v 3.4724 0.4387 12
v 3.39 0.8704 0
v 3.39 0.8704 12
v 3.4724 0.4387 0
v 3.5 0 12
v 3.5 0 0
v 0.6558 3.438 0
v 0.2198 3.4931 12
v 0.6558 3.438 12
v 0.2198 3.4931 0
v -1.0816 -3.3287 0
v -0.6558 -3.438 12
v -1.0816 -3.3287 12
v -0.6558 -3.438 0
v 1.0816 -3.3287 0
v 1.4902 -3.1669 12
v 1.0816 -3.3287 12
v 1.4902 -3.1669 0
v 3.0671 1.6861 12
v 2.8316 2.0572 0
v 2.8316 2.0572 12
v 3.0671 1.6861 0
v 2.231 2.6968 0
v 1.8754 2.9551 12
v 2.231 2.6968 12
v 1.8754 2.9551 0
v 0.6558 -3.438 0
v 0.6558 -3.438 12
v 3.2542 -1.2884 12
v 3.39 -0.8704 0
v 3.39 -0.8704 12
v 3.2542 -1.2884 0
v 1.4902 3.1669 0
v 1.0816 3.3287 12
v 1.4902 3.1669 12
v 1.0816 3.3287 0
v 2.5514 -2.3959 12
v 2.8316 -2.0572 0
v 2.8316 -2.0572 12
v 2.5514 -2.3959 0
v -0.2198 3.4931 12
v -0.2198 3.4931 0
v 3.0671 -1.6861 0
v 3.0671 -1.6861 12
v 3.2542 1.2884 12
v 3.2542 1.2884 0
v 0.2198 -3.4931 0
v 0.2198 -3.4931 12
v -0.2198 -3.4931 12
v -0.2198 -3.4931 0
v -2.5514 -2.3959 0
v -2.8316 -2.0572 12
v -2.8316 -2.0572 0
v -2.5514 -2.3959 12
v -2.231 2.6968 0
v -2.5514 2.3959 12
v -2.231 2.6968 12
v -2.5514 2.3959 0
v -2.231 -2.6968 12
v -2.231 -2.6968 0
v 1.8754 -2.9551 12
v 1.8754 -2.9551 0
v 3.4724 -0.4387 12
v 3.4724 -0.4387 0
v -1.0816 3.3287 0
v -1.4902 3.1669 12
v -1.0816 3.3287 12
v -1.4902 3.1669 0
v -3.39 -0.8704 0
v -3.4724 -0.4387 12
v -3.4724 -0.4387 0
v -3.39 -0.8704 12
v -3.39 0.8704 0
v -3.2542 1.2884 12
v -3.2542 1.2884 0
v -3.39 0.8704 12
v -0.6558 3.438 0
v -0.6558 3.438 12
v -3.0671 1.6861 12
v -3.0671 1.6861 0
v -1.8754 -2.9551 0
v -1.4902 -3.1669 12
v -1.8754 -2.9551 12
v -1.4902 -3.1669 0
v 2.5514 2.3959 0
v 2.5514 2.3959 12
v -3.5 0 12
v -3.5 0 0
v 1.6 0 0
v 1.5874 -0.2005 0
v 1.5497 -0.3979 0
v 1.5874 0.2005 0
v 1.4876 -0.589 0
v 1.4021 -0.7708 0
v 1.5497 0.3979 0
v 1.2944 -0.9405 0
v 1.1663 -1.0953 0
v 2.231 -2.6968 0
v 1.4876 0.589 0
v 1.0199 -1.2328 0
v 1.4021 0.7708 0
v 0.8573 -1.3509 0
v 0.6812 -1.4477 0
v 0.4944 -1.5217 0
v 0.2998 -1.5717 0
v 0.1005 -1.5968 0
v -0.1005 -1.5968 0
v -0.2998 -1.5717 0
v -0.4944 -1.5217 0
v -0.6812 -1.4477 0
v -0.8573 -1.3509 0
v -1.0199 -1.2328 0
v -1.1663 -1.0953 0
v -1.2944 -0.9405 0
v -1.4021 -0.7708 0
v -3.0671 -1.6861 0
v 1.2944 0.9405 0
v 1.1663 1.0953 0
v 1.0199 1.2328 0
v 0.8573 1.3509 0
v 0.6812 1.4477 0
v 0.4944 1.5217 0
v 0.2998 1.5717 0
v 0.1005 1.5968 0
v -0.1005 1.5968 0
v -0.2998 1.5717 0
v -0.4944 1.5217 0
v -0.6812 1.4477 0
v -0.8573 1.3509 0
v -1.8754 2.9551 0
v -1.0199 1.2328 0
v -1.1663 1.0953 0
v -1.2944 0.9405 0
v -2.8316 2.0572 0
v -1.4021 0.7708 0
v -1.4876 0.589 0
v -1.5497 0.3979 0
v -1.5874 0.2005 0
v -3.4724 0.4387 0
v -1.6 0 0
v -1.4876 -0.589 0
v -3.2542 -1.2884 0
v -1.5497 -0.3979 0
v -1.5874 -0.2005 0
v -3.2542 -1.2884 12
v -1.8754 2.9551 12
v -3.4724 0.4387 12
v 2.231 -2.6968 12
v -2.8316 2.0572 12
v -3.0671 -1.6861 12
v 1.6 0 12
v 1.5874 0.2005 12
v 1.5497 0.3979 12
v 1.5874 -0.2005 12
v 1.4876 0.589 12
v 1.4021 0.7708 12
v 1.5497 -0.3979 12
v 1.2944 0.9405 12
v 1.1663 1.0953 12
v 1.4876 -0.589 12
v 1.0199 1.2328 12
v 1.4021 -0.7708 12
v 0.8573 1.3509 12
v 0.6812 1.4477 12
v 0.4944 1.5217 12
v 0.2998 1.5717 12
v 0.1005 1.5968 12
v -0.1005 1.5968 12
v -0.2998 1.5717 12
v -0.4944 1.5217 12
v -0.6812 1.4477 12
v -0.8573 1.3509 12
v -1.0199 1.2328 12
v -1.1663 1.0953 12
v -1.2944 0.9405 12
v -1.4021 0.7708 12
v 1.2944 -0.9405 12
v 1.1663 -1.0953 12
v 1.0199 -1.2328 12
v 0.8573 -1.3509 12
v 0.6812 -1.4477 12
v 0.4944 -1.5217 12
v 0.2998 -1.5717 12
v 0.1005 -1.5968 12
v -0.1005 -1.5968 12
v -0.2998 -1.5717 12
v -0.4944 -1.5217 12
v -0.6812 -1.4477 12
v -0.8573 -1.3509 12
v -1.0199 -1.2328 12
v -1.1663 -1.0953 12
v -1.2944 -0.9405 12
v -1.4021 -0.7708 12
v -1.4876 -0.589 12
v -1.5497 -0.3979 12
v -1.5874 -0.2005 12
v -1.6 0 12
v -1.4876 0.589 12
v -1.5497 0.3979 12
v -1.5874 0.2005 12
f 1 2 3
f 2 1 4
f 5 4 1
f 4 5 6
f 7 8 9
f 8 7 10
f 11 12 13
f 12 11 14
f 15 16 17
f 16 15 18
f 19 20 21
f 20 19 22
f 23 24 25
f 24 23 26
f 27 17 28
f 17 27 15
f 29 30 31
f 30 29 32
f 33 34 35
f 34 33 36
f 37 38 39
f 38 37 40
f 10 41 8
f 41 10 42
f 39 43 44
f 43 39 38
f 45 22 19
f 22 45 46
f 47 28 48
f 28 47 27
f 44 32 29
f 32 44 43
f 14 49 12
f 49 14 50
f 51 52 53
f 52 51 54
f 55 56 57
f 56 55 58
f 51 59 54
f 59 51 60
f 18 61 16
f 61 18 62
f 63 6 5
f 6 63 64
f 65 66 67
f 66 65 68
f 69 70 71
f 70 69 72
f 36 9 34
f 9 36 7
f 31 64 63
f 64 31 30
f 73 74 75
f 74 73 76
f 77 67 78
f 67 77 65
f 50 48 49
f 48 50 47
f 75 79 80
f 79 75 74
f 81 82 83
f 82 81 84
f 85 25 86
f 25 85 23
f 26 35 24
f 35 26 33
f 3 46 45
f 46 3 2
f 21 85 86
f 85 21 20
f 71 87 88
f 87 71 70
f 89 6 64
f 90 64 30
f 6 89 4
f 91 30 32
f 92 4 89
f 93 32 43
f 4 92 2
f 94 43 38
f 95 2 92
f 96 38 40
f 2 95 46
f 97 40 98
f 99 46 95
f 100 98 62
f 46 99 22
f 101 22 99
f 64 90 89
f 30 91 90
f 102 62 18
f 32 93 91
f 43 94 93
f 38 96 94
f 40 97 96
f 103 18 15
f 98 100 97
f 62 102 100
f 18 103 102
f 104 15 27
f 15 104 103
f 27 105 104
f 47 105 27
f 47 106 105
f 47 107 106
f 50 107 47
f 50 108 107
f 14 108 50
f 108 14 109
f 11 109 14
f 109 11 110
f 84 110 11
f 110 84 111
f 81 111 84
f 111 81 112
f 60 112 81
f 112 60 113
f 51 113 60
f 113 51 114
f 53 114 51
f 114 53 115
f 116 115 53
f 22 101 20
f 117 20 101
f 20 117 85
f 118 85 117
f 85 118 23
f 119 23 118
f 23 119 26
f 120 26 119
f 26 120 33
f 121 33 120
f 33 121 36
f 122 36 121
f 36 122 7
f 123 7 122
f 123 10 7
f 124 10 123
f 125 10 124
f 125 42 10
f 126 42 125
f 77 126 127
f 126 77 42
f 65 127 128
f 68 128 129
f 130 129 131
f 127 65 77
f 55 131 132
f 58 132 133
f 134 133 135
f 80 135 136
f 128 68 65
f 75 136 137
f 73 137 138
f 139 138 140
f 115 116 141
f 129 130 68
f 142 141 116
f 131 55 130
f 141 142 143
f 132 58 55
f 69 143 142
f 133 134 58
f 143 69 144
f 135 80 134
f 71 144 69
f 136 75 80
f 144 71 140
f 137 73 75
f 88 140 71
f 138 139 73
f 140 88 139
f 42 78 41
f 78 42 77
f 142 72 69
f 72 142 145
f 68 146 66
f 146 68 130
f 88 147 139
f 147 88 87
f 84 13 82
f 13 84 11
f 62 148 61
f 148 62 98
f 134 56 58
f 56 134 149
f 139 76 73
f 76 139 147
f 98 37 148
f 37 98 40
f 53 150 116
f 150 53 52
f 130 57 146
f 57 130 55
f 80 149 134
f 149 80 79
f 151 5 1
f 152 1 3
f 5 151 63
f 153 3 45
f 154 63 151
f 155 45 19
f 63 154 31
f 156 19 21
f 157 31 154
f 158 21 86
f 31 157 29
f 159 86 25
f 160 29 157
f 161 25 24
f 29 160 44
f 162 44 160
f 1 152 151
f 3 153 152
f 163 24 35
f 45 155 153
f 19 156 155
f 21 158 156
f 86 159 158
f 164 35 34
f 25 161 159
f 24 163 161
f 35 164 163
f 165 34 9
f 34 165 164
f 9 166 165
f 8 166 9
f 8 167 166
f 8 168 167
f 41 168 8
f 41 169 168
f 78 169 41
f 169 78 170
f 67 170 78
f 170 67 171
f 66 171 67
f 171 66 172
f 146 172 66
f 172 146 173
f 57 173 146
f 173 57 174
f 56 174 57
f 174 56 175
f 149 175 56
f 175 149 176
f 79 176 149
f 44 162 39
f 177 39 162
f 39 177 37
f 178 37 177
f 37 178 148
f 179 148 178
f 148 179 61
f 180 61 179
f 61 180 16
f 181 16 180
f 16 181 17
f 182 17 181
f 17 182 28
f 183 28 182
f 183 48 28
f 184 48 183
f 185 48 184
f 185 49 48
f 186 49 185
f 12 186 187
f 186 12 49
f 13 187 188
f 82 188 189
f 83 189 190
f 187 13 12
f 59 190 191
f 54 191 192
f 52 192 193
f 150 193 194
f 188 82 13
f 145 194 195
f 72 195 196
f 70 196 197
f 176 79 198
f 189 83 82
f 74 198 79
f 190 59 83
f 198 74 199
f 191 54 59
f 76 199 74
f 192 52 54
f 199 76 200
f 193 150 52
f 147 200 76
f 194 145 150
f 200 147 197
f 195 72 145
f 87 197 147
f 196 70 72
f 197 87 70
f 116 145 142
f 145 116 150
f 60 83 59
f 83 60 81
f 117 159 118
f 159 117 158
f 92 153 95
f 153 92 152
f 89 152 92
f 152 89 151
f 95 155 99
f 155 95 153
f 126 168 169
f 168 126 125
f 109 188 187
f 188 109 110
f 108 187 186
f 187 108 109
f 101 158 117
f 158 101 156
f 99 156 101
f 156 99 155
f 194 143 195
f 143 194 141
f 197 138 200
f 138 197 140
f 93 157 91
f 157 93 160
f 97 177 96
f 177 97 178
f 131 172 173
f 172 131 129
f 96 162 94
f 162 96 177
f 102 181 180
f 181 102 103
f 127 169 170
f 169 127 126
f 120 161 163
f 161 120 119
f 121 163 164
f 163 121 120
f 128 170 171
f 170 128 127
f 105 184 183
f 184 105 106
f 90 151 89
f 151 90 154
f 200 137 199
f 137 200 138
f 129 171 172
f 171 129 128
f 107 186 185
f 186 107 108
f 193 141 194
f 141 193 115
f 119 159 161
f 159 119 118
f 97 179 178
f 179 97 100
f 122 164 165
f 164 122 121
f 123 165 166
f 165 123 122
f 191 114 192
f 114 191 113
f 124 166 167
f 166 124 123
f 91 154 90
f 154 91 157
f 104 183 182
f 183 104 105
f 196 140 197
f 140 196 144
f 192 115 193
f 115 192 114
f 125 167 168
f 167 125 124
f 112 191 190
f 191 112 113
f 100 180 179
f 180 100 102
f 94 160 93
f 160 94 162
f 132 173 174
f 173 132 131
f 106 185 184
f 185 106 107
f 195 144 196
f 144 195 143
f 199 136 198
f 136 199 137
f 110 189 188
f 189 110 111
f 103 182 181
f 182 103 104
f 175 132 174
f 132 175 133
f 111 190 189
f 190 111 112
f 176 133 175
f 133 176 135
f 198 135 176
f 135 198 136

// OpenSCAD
$fn = 50;

height = 12;        // mm
screw_size = 3;     // mm
wall_thickness = 2; // mm
hex = 0;            // If hex = 0 it will be round, otherwise hex
slip = 1;           // If slip = 1 it will add 0.2mm to the hole diameter to make sure it slides over.


difference() {
    cylinder(h=12, d=screw_size + 2*wall_thickness);
    if (slip == 1)
        cylinder(h=12, d=screw_size+0.2);
    else
        cylinder(h=12, d=screw_size);
}
